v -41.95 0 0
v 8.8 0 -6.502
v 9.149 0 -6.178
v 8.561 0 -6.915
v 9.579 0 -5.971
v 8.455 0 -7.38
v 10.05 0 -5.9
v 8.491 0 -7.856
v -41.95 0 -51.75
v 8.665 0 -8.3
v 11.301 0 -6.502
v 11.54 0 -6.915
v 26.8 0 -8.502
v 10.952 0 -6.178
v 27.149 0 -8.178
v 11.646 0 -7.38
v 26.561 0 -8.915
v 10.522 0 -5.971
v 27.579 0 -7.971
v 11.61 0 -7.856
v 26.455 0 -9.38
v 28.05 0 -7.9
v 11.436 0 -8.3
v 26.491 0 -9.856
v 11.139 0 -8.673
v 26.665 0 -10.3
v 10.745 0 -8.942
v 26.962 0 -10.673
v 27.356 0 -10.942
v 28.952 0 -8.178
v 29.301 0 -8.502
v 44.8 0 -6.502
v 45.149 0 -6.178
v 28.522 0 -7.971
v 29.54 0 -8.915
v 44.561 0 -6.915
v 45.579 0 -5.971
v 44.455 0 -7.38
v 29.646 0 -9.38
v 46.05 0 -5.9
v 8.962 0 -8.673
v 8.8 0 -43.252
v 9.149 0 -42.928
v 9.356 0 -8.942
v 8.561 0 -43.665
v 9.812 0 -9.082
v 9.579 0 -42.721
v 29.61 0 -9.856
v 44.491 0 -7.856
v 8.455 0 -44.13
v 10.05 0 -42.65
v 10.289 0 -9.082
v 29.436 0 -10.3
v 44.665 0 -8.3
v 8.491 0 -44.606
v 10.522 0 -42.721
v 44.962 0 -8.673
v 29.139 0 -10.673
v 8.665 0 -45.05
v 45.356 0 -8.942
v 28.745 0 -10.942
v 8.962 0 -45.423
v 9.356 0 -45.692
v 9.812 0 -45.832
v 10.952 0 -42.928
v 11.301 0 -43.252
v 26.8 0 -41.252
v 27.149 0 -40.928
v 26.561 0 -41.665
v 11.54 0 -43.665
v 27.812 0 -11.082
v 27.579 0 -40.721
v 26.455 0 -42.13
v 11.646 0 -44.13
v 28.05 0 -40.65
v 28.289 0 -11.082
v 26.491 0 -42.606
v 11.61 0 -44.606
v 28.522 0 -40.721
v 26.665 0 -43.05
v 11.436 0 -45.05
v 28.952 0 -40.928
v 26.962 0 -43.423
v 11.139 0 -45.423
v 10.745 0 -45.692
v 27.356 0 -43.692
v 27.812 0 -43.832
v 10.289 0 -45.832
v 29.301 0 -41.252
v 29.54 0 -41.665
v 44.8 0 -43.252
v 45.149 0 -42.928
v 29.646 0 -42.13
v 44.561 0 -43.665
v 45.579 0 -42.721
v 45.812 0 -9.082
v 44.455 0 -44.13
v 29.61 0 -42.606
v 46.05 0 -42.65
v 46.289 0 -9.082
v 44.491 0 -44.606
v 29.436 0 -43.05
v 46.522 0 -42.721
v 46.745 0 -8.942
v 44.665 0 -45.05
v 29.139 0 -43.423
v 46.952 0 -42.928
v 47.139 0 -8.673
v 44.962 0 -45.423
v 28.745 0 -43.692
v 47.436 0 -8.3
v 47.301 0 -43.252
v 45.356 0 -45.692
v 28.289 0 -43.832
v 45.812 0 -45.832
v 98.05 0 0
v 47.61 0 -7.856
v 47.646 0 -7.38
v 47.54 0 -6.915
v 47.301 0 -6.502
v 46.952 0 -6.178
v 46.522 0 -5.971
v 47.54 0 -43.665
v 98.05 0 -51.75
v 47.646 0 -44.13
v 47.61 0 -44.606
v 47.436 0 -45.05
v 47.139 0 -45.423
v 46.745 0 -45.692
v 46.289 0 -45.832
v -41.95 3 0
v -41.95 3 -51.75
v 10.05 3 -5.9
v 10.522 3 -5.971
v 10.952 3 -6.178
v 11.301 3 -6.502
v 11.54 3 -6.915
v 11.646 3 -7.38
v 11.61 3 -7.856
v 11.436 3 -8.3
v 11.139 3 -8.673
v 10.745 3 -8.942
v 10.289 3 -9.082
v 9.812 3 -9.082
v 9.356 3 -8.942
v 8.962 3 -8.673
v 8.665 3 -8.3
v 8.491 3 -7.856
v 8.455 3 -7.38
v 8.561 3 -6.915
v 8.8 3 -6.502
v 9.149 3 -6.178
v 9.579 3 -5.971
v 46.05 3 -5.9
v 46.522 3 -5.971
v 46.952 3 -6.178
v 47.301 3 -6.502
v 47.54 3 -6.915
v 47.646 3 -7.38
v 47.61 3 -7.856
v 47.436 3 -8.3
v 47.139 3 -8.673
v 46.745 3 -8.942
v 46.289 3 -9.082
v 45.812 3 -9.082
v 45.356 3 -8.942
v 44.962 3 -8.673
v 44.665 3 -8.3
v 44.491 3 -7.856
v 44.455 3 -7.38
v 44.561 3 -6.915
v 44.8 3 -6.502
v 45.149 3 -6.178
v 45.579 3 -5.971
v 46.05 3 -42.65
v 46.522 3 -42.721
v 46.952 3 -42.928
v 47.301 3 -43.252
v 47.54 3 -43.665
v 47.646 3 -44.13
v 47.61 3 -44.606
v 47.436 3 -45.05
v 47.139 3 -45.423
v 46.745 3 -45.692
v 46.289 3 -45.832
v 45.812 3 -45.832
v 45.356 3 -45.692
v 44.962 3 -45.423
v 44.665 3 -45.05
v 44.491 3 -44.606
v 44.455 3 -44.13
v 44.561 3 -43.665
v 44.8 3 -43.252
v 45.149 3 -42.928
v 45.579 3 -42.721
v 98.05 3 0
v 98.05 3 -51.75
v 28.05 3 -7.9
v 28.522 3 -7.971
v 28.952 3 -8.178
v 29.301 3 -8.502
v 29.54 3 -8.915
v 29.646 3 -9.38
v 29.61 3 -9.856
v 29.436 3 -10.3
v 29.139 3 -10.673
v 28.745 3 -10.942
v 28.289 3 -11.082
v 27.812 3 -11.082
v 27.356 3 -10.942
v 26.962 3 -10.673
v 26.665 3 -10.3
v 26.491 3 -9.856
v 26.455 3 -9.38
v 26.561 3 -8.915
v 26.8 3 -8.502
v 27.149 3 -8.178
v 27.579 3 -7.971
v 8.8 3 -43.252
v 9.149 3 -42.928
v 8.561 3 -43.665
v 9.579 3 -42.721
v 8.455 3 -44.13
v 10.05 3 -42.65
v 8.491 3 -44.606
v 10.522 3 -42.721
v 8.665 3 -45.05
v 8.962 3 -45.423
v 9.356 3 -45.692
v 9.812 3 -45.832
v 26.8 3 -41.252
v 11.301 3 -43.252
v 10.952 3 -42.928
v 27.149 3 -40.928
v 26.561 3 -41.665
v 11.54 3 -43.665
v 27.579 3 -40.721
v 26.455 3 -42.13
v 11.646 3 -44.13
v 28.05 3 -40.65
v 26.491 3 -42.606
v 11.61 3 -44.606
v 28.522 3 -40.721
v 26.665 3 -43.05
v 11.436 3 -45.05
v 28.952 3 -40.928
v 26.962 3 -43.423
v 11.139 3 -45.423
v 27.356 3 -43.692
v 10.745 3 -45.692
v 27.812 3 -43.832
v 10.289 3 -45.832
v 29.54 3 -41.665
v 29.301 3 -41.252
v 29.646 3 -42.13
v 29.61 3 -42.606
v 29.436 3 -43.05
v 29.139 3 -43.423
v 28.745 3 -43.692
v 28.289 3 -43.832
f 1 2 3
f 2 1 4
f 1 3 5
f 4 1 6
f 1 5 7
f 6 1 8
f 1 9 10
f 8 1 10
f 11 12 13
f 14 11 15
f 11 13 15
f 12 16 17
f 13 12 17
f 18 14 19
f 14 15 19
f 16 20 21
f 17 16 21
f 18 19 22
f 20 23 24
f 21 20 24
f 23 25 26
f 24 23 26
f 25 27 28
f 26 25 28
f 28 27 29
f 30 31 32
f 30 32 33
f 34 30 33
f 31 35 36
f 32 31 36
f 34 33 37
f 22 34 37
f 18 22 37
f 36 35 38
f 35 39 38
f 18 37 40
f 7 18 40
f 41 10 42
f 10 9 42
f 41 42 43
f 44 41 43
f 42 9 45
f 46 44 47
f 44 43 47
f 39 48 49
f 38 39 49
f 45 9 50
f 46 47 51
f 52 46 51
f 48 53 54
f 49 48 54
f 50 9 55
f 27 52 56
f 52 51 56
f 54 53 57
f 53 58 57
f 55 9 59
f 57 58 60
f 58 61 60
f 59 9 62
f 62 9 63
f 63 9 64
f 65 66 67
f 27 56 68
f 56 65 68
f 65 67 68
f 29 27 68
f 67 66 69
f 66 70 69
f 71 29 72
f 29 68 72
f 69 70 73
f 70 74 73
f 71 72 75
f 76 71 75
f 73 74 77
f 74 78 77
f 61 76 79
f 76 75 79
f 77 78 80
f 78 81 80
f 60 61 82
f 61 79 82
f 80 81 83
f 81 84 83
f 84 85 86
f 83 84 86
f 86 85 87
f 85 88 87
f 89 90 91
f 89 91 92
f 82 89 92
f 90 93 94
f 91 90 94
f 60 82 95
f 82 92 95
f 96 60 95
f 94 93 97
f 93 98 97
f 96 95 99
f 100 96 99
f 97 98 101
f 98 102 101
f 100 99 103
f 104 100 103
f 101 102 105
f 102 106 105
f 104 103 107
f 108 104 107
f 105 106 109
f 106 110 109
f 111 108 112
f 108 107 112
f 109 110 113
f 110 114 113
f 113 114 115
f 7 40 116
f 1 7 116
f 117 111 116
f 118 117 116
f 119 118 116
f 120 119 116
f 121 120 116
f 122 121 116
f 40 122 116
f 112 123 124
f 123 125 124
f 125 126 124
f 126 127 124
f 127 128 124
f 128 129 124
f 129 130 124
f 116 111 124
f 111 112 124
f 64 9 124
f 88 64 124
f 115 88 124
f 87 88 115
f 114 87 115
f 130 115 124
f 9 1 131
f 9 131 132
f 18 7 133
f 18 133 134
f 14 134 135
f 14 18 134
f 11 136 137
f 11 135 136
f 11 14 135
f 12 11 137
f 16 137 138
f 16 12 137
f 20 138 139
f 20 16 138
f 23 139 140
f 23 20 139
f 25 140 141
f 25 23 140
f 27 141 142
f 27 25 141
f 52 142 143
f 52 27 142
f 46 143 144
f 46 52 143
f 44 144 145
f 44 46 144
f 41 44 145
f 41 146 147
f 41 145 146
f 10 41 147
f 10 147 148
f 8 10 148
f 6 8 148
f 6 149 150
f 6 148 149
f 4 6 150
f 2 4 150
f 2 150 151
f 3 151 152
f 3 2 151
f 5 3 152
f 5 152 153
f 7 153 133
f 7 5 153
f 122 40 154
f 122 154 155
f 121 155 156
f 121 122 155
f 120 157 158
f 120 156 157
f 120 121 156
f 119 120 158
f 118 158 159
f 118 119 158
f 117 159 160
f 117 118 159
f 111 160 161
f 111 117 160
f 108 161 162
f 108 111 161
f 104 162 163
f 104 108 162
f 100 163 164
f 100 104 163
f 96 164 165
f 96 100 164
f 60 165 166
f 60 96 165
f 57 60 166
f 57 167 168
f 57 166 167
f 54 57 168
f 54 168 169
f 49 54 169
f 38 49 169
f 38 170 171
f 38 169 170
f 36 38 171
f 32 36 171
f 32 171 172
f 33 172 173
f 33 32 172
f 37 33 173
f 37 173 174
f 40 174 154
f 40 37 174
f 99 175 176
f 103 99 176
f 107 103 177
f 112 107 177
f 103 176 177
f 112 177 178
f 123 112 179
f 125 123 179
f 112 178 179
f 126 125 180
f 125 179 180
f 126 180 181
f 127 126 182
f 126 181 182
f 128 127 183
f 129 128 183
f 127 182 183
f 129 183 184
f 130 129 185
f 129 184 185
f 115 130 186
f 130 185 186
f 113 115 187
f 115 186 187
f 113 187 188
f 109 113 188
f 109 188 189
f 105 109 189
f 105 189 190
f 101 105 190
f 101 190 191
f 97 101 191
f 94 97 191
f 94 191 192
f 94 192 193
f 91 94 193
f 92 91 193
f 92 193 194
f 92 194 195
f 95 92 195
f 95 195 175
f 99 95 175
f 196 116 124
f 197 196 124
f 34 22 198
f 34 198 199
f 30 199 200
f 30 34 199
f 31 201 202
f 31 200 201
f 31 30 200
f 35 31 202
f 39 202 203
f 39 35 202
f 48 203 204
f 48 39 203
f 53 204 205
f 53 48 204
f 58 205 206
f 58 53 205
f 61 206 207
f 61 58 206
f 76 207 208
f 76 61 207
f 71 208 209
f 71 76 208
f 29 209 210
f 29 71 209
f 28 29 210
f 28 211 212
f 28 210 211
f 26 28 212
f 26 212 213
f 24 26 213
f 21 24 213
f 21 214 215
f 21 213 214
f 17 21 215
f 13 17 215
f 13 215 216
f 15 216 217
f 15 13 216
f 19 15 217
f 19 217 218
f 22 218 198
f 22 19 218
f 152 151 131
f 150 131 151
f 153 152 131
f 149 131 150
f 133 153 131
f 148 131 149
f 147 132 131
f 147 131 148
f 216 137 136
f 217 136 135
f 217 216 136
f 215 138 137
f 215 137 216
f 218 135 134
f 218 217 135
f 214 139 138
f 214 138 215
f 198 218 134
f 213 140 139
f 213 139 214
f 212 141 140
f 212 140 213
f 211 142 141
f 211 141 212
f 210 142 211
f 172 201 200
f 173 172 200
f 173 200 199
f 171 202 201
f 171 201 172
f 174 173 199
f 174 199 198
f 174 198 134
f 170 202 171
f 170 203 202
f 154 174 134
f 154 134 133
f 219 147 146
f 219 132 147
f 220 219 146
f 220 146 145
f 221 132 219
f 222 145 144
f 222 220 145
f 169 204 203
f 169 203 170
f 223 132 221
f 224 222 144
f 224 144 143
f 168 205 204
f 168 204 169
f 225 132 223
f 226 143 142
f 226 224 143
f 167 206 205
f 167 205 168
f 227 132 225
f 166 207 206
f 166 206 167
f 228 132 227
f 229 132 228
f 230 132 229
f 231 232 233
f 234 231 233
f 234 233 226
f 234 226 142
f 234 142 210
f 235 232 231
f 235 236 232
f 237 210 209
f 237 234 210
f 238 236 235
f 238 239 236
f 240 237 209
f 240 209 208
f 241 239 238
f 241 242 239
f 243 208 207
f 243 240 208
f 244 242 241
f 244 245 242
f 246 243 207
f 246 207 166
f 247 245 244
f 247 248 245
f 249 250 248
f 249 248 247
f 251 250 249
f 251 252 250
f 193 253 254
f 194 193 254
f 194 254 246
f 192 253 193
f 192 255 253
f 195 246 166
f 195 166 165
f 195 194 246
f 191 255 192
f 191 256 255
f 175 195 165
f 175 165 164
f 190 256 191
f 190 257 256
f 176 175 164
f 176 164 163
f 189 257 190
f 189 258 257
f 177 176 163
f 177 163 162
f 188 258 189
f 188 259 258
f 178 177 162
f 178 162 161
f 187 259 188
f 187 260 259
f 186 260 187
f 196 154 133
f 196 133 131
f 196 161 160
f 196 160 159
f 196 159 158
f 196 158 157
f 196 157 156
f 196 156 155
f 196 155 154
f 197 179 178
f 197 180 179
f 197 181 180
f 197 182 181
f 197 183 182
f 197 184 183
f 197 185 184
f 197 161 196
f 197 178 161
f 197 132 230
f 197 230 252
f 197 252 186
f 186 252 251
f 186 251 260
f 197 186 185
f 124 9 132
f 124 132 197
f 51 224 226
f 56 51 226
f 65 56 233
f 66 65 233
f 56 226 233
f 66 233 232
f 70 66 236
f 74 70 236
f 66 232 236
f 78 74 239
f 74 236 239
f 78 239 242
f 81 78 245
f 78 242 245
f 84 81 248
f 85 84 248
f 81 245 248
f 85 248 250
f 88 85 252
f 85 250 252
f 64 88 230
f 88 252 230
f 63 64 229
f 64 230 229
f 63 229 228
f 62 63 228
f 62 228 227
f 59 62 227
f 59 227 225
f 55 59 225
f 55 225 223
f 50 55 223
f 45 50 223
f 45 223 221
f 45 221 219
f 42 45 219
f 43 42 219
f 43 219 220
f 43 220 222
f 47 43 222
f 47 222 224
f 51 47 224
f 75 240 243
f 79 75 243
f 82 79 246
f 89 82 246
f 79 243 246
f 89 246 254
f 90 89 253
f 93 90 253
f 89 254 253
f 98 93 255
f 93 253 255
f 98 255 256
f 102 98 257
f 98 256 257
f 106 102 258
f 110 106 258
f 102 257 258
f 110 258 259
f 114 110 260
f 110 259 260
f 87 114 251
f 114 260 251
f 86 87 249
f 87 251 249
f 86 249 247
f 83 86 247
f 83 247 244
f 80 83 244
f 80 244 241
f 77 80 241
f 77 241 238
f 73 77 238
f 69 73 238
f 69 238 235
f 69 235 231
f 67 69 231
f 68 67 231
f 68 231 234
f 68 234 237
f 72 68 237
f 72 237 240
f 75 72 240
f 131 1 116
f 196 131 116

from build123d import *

# Parameters (mm, degrees)
SKETCH_1_W               = 140
SKETCH_1_H               = 51.75
EXTRUDE_1_DEPTH          = 3
CUT_EXTRUDE_1_DEPTH      = 111.909649071
CUT_EXTRUDE_1_DEPTH_BACK = 111.909649071
SKETCH_2_R               = 1.6
SKETCH_3_R               = 1.6
CUT_EXTRUDE_2_DEPTH      = 10


with BuildPart() as part:
    # 草图1 → 凸台-拉伸1 (new body)
    with BuildSketch(Plane(origin=(0, 0, 0), x_dir=(1, 0, 0), z_dir=(0, 1, 0))):
        with Locations((28.050434762, 25.875)):
            Rectangle(SKETCH_1_W, SKETCH_1_H)
    extrude(amount=EXTRUDE_1_DEPTH)

    # 草图2 → 切除-拉伸1 (cut, two sides: drawn at the far end of the back side and taken through both)
    with BuildSketch(Plane(origin=(0, 3, 0), x_dir=(1, 0, 0), z_dir=(0, 1, 0)).offset(-CUT_EXTRUDE_1_DEPTH_BACK)):
        with Locations(Location((28.050434762, 9.5, 0), (0, 0, 270))):
            Circle(SKETCH_2_R)
        with Locations(Location((46.050434762, 7.5, 0), (0, 0, 270))):
            Circle(SKETCH_2_R)
        with Locations(Location((10.050434762, 7.5, 0), (0, 0, 270))):
            Circle(SKETCH_2_R)
    extrude(amount=CUT_EXTRUDE_1_DEPTH + CUT_EXTRUDE_1_DEPTH_BACK, mode=Mode.SUBTRACT)

    # 草图3 → 切除-拉伸2 (cut)
    with BuildSketch(Plane(origin=(0, 3, 0), x_dir=(1, 0, 0), z_dir=(0, 1, 0))):
        with Locations(Location((10.050434762, 44.25, 0), (0, 0, 270))):
            Circle(SKETCH_3_R)
        with Locations(Location((28.050434762, 42.25, 0), (0, 0, 270))):
            Circle(SKETCH_3_R)
        with Locations(Location((46.050434762, 44.25, 0), (0, 0, 270))):
            Circle(SKETCH_3_R)
    extrude(amount=-CUT_EXTRUDE_2_DEPTH, mode=Mode.SUBTRACT)


solid = part.part
